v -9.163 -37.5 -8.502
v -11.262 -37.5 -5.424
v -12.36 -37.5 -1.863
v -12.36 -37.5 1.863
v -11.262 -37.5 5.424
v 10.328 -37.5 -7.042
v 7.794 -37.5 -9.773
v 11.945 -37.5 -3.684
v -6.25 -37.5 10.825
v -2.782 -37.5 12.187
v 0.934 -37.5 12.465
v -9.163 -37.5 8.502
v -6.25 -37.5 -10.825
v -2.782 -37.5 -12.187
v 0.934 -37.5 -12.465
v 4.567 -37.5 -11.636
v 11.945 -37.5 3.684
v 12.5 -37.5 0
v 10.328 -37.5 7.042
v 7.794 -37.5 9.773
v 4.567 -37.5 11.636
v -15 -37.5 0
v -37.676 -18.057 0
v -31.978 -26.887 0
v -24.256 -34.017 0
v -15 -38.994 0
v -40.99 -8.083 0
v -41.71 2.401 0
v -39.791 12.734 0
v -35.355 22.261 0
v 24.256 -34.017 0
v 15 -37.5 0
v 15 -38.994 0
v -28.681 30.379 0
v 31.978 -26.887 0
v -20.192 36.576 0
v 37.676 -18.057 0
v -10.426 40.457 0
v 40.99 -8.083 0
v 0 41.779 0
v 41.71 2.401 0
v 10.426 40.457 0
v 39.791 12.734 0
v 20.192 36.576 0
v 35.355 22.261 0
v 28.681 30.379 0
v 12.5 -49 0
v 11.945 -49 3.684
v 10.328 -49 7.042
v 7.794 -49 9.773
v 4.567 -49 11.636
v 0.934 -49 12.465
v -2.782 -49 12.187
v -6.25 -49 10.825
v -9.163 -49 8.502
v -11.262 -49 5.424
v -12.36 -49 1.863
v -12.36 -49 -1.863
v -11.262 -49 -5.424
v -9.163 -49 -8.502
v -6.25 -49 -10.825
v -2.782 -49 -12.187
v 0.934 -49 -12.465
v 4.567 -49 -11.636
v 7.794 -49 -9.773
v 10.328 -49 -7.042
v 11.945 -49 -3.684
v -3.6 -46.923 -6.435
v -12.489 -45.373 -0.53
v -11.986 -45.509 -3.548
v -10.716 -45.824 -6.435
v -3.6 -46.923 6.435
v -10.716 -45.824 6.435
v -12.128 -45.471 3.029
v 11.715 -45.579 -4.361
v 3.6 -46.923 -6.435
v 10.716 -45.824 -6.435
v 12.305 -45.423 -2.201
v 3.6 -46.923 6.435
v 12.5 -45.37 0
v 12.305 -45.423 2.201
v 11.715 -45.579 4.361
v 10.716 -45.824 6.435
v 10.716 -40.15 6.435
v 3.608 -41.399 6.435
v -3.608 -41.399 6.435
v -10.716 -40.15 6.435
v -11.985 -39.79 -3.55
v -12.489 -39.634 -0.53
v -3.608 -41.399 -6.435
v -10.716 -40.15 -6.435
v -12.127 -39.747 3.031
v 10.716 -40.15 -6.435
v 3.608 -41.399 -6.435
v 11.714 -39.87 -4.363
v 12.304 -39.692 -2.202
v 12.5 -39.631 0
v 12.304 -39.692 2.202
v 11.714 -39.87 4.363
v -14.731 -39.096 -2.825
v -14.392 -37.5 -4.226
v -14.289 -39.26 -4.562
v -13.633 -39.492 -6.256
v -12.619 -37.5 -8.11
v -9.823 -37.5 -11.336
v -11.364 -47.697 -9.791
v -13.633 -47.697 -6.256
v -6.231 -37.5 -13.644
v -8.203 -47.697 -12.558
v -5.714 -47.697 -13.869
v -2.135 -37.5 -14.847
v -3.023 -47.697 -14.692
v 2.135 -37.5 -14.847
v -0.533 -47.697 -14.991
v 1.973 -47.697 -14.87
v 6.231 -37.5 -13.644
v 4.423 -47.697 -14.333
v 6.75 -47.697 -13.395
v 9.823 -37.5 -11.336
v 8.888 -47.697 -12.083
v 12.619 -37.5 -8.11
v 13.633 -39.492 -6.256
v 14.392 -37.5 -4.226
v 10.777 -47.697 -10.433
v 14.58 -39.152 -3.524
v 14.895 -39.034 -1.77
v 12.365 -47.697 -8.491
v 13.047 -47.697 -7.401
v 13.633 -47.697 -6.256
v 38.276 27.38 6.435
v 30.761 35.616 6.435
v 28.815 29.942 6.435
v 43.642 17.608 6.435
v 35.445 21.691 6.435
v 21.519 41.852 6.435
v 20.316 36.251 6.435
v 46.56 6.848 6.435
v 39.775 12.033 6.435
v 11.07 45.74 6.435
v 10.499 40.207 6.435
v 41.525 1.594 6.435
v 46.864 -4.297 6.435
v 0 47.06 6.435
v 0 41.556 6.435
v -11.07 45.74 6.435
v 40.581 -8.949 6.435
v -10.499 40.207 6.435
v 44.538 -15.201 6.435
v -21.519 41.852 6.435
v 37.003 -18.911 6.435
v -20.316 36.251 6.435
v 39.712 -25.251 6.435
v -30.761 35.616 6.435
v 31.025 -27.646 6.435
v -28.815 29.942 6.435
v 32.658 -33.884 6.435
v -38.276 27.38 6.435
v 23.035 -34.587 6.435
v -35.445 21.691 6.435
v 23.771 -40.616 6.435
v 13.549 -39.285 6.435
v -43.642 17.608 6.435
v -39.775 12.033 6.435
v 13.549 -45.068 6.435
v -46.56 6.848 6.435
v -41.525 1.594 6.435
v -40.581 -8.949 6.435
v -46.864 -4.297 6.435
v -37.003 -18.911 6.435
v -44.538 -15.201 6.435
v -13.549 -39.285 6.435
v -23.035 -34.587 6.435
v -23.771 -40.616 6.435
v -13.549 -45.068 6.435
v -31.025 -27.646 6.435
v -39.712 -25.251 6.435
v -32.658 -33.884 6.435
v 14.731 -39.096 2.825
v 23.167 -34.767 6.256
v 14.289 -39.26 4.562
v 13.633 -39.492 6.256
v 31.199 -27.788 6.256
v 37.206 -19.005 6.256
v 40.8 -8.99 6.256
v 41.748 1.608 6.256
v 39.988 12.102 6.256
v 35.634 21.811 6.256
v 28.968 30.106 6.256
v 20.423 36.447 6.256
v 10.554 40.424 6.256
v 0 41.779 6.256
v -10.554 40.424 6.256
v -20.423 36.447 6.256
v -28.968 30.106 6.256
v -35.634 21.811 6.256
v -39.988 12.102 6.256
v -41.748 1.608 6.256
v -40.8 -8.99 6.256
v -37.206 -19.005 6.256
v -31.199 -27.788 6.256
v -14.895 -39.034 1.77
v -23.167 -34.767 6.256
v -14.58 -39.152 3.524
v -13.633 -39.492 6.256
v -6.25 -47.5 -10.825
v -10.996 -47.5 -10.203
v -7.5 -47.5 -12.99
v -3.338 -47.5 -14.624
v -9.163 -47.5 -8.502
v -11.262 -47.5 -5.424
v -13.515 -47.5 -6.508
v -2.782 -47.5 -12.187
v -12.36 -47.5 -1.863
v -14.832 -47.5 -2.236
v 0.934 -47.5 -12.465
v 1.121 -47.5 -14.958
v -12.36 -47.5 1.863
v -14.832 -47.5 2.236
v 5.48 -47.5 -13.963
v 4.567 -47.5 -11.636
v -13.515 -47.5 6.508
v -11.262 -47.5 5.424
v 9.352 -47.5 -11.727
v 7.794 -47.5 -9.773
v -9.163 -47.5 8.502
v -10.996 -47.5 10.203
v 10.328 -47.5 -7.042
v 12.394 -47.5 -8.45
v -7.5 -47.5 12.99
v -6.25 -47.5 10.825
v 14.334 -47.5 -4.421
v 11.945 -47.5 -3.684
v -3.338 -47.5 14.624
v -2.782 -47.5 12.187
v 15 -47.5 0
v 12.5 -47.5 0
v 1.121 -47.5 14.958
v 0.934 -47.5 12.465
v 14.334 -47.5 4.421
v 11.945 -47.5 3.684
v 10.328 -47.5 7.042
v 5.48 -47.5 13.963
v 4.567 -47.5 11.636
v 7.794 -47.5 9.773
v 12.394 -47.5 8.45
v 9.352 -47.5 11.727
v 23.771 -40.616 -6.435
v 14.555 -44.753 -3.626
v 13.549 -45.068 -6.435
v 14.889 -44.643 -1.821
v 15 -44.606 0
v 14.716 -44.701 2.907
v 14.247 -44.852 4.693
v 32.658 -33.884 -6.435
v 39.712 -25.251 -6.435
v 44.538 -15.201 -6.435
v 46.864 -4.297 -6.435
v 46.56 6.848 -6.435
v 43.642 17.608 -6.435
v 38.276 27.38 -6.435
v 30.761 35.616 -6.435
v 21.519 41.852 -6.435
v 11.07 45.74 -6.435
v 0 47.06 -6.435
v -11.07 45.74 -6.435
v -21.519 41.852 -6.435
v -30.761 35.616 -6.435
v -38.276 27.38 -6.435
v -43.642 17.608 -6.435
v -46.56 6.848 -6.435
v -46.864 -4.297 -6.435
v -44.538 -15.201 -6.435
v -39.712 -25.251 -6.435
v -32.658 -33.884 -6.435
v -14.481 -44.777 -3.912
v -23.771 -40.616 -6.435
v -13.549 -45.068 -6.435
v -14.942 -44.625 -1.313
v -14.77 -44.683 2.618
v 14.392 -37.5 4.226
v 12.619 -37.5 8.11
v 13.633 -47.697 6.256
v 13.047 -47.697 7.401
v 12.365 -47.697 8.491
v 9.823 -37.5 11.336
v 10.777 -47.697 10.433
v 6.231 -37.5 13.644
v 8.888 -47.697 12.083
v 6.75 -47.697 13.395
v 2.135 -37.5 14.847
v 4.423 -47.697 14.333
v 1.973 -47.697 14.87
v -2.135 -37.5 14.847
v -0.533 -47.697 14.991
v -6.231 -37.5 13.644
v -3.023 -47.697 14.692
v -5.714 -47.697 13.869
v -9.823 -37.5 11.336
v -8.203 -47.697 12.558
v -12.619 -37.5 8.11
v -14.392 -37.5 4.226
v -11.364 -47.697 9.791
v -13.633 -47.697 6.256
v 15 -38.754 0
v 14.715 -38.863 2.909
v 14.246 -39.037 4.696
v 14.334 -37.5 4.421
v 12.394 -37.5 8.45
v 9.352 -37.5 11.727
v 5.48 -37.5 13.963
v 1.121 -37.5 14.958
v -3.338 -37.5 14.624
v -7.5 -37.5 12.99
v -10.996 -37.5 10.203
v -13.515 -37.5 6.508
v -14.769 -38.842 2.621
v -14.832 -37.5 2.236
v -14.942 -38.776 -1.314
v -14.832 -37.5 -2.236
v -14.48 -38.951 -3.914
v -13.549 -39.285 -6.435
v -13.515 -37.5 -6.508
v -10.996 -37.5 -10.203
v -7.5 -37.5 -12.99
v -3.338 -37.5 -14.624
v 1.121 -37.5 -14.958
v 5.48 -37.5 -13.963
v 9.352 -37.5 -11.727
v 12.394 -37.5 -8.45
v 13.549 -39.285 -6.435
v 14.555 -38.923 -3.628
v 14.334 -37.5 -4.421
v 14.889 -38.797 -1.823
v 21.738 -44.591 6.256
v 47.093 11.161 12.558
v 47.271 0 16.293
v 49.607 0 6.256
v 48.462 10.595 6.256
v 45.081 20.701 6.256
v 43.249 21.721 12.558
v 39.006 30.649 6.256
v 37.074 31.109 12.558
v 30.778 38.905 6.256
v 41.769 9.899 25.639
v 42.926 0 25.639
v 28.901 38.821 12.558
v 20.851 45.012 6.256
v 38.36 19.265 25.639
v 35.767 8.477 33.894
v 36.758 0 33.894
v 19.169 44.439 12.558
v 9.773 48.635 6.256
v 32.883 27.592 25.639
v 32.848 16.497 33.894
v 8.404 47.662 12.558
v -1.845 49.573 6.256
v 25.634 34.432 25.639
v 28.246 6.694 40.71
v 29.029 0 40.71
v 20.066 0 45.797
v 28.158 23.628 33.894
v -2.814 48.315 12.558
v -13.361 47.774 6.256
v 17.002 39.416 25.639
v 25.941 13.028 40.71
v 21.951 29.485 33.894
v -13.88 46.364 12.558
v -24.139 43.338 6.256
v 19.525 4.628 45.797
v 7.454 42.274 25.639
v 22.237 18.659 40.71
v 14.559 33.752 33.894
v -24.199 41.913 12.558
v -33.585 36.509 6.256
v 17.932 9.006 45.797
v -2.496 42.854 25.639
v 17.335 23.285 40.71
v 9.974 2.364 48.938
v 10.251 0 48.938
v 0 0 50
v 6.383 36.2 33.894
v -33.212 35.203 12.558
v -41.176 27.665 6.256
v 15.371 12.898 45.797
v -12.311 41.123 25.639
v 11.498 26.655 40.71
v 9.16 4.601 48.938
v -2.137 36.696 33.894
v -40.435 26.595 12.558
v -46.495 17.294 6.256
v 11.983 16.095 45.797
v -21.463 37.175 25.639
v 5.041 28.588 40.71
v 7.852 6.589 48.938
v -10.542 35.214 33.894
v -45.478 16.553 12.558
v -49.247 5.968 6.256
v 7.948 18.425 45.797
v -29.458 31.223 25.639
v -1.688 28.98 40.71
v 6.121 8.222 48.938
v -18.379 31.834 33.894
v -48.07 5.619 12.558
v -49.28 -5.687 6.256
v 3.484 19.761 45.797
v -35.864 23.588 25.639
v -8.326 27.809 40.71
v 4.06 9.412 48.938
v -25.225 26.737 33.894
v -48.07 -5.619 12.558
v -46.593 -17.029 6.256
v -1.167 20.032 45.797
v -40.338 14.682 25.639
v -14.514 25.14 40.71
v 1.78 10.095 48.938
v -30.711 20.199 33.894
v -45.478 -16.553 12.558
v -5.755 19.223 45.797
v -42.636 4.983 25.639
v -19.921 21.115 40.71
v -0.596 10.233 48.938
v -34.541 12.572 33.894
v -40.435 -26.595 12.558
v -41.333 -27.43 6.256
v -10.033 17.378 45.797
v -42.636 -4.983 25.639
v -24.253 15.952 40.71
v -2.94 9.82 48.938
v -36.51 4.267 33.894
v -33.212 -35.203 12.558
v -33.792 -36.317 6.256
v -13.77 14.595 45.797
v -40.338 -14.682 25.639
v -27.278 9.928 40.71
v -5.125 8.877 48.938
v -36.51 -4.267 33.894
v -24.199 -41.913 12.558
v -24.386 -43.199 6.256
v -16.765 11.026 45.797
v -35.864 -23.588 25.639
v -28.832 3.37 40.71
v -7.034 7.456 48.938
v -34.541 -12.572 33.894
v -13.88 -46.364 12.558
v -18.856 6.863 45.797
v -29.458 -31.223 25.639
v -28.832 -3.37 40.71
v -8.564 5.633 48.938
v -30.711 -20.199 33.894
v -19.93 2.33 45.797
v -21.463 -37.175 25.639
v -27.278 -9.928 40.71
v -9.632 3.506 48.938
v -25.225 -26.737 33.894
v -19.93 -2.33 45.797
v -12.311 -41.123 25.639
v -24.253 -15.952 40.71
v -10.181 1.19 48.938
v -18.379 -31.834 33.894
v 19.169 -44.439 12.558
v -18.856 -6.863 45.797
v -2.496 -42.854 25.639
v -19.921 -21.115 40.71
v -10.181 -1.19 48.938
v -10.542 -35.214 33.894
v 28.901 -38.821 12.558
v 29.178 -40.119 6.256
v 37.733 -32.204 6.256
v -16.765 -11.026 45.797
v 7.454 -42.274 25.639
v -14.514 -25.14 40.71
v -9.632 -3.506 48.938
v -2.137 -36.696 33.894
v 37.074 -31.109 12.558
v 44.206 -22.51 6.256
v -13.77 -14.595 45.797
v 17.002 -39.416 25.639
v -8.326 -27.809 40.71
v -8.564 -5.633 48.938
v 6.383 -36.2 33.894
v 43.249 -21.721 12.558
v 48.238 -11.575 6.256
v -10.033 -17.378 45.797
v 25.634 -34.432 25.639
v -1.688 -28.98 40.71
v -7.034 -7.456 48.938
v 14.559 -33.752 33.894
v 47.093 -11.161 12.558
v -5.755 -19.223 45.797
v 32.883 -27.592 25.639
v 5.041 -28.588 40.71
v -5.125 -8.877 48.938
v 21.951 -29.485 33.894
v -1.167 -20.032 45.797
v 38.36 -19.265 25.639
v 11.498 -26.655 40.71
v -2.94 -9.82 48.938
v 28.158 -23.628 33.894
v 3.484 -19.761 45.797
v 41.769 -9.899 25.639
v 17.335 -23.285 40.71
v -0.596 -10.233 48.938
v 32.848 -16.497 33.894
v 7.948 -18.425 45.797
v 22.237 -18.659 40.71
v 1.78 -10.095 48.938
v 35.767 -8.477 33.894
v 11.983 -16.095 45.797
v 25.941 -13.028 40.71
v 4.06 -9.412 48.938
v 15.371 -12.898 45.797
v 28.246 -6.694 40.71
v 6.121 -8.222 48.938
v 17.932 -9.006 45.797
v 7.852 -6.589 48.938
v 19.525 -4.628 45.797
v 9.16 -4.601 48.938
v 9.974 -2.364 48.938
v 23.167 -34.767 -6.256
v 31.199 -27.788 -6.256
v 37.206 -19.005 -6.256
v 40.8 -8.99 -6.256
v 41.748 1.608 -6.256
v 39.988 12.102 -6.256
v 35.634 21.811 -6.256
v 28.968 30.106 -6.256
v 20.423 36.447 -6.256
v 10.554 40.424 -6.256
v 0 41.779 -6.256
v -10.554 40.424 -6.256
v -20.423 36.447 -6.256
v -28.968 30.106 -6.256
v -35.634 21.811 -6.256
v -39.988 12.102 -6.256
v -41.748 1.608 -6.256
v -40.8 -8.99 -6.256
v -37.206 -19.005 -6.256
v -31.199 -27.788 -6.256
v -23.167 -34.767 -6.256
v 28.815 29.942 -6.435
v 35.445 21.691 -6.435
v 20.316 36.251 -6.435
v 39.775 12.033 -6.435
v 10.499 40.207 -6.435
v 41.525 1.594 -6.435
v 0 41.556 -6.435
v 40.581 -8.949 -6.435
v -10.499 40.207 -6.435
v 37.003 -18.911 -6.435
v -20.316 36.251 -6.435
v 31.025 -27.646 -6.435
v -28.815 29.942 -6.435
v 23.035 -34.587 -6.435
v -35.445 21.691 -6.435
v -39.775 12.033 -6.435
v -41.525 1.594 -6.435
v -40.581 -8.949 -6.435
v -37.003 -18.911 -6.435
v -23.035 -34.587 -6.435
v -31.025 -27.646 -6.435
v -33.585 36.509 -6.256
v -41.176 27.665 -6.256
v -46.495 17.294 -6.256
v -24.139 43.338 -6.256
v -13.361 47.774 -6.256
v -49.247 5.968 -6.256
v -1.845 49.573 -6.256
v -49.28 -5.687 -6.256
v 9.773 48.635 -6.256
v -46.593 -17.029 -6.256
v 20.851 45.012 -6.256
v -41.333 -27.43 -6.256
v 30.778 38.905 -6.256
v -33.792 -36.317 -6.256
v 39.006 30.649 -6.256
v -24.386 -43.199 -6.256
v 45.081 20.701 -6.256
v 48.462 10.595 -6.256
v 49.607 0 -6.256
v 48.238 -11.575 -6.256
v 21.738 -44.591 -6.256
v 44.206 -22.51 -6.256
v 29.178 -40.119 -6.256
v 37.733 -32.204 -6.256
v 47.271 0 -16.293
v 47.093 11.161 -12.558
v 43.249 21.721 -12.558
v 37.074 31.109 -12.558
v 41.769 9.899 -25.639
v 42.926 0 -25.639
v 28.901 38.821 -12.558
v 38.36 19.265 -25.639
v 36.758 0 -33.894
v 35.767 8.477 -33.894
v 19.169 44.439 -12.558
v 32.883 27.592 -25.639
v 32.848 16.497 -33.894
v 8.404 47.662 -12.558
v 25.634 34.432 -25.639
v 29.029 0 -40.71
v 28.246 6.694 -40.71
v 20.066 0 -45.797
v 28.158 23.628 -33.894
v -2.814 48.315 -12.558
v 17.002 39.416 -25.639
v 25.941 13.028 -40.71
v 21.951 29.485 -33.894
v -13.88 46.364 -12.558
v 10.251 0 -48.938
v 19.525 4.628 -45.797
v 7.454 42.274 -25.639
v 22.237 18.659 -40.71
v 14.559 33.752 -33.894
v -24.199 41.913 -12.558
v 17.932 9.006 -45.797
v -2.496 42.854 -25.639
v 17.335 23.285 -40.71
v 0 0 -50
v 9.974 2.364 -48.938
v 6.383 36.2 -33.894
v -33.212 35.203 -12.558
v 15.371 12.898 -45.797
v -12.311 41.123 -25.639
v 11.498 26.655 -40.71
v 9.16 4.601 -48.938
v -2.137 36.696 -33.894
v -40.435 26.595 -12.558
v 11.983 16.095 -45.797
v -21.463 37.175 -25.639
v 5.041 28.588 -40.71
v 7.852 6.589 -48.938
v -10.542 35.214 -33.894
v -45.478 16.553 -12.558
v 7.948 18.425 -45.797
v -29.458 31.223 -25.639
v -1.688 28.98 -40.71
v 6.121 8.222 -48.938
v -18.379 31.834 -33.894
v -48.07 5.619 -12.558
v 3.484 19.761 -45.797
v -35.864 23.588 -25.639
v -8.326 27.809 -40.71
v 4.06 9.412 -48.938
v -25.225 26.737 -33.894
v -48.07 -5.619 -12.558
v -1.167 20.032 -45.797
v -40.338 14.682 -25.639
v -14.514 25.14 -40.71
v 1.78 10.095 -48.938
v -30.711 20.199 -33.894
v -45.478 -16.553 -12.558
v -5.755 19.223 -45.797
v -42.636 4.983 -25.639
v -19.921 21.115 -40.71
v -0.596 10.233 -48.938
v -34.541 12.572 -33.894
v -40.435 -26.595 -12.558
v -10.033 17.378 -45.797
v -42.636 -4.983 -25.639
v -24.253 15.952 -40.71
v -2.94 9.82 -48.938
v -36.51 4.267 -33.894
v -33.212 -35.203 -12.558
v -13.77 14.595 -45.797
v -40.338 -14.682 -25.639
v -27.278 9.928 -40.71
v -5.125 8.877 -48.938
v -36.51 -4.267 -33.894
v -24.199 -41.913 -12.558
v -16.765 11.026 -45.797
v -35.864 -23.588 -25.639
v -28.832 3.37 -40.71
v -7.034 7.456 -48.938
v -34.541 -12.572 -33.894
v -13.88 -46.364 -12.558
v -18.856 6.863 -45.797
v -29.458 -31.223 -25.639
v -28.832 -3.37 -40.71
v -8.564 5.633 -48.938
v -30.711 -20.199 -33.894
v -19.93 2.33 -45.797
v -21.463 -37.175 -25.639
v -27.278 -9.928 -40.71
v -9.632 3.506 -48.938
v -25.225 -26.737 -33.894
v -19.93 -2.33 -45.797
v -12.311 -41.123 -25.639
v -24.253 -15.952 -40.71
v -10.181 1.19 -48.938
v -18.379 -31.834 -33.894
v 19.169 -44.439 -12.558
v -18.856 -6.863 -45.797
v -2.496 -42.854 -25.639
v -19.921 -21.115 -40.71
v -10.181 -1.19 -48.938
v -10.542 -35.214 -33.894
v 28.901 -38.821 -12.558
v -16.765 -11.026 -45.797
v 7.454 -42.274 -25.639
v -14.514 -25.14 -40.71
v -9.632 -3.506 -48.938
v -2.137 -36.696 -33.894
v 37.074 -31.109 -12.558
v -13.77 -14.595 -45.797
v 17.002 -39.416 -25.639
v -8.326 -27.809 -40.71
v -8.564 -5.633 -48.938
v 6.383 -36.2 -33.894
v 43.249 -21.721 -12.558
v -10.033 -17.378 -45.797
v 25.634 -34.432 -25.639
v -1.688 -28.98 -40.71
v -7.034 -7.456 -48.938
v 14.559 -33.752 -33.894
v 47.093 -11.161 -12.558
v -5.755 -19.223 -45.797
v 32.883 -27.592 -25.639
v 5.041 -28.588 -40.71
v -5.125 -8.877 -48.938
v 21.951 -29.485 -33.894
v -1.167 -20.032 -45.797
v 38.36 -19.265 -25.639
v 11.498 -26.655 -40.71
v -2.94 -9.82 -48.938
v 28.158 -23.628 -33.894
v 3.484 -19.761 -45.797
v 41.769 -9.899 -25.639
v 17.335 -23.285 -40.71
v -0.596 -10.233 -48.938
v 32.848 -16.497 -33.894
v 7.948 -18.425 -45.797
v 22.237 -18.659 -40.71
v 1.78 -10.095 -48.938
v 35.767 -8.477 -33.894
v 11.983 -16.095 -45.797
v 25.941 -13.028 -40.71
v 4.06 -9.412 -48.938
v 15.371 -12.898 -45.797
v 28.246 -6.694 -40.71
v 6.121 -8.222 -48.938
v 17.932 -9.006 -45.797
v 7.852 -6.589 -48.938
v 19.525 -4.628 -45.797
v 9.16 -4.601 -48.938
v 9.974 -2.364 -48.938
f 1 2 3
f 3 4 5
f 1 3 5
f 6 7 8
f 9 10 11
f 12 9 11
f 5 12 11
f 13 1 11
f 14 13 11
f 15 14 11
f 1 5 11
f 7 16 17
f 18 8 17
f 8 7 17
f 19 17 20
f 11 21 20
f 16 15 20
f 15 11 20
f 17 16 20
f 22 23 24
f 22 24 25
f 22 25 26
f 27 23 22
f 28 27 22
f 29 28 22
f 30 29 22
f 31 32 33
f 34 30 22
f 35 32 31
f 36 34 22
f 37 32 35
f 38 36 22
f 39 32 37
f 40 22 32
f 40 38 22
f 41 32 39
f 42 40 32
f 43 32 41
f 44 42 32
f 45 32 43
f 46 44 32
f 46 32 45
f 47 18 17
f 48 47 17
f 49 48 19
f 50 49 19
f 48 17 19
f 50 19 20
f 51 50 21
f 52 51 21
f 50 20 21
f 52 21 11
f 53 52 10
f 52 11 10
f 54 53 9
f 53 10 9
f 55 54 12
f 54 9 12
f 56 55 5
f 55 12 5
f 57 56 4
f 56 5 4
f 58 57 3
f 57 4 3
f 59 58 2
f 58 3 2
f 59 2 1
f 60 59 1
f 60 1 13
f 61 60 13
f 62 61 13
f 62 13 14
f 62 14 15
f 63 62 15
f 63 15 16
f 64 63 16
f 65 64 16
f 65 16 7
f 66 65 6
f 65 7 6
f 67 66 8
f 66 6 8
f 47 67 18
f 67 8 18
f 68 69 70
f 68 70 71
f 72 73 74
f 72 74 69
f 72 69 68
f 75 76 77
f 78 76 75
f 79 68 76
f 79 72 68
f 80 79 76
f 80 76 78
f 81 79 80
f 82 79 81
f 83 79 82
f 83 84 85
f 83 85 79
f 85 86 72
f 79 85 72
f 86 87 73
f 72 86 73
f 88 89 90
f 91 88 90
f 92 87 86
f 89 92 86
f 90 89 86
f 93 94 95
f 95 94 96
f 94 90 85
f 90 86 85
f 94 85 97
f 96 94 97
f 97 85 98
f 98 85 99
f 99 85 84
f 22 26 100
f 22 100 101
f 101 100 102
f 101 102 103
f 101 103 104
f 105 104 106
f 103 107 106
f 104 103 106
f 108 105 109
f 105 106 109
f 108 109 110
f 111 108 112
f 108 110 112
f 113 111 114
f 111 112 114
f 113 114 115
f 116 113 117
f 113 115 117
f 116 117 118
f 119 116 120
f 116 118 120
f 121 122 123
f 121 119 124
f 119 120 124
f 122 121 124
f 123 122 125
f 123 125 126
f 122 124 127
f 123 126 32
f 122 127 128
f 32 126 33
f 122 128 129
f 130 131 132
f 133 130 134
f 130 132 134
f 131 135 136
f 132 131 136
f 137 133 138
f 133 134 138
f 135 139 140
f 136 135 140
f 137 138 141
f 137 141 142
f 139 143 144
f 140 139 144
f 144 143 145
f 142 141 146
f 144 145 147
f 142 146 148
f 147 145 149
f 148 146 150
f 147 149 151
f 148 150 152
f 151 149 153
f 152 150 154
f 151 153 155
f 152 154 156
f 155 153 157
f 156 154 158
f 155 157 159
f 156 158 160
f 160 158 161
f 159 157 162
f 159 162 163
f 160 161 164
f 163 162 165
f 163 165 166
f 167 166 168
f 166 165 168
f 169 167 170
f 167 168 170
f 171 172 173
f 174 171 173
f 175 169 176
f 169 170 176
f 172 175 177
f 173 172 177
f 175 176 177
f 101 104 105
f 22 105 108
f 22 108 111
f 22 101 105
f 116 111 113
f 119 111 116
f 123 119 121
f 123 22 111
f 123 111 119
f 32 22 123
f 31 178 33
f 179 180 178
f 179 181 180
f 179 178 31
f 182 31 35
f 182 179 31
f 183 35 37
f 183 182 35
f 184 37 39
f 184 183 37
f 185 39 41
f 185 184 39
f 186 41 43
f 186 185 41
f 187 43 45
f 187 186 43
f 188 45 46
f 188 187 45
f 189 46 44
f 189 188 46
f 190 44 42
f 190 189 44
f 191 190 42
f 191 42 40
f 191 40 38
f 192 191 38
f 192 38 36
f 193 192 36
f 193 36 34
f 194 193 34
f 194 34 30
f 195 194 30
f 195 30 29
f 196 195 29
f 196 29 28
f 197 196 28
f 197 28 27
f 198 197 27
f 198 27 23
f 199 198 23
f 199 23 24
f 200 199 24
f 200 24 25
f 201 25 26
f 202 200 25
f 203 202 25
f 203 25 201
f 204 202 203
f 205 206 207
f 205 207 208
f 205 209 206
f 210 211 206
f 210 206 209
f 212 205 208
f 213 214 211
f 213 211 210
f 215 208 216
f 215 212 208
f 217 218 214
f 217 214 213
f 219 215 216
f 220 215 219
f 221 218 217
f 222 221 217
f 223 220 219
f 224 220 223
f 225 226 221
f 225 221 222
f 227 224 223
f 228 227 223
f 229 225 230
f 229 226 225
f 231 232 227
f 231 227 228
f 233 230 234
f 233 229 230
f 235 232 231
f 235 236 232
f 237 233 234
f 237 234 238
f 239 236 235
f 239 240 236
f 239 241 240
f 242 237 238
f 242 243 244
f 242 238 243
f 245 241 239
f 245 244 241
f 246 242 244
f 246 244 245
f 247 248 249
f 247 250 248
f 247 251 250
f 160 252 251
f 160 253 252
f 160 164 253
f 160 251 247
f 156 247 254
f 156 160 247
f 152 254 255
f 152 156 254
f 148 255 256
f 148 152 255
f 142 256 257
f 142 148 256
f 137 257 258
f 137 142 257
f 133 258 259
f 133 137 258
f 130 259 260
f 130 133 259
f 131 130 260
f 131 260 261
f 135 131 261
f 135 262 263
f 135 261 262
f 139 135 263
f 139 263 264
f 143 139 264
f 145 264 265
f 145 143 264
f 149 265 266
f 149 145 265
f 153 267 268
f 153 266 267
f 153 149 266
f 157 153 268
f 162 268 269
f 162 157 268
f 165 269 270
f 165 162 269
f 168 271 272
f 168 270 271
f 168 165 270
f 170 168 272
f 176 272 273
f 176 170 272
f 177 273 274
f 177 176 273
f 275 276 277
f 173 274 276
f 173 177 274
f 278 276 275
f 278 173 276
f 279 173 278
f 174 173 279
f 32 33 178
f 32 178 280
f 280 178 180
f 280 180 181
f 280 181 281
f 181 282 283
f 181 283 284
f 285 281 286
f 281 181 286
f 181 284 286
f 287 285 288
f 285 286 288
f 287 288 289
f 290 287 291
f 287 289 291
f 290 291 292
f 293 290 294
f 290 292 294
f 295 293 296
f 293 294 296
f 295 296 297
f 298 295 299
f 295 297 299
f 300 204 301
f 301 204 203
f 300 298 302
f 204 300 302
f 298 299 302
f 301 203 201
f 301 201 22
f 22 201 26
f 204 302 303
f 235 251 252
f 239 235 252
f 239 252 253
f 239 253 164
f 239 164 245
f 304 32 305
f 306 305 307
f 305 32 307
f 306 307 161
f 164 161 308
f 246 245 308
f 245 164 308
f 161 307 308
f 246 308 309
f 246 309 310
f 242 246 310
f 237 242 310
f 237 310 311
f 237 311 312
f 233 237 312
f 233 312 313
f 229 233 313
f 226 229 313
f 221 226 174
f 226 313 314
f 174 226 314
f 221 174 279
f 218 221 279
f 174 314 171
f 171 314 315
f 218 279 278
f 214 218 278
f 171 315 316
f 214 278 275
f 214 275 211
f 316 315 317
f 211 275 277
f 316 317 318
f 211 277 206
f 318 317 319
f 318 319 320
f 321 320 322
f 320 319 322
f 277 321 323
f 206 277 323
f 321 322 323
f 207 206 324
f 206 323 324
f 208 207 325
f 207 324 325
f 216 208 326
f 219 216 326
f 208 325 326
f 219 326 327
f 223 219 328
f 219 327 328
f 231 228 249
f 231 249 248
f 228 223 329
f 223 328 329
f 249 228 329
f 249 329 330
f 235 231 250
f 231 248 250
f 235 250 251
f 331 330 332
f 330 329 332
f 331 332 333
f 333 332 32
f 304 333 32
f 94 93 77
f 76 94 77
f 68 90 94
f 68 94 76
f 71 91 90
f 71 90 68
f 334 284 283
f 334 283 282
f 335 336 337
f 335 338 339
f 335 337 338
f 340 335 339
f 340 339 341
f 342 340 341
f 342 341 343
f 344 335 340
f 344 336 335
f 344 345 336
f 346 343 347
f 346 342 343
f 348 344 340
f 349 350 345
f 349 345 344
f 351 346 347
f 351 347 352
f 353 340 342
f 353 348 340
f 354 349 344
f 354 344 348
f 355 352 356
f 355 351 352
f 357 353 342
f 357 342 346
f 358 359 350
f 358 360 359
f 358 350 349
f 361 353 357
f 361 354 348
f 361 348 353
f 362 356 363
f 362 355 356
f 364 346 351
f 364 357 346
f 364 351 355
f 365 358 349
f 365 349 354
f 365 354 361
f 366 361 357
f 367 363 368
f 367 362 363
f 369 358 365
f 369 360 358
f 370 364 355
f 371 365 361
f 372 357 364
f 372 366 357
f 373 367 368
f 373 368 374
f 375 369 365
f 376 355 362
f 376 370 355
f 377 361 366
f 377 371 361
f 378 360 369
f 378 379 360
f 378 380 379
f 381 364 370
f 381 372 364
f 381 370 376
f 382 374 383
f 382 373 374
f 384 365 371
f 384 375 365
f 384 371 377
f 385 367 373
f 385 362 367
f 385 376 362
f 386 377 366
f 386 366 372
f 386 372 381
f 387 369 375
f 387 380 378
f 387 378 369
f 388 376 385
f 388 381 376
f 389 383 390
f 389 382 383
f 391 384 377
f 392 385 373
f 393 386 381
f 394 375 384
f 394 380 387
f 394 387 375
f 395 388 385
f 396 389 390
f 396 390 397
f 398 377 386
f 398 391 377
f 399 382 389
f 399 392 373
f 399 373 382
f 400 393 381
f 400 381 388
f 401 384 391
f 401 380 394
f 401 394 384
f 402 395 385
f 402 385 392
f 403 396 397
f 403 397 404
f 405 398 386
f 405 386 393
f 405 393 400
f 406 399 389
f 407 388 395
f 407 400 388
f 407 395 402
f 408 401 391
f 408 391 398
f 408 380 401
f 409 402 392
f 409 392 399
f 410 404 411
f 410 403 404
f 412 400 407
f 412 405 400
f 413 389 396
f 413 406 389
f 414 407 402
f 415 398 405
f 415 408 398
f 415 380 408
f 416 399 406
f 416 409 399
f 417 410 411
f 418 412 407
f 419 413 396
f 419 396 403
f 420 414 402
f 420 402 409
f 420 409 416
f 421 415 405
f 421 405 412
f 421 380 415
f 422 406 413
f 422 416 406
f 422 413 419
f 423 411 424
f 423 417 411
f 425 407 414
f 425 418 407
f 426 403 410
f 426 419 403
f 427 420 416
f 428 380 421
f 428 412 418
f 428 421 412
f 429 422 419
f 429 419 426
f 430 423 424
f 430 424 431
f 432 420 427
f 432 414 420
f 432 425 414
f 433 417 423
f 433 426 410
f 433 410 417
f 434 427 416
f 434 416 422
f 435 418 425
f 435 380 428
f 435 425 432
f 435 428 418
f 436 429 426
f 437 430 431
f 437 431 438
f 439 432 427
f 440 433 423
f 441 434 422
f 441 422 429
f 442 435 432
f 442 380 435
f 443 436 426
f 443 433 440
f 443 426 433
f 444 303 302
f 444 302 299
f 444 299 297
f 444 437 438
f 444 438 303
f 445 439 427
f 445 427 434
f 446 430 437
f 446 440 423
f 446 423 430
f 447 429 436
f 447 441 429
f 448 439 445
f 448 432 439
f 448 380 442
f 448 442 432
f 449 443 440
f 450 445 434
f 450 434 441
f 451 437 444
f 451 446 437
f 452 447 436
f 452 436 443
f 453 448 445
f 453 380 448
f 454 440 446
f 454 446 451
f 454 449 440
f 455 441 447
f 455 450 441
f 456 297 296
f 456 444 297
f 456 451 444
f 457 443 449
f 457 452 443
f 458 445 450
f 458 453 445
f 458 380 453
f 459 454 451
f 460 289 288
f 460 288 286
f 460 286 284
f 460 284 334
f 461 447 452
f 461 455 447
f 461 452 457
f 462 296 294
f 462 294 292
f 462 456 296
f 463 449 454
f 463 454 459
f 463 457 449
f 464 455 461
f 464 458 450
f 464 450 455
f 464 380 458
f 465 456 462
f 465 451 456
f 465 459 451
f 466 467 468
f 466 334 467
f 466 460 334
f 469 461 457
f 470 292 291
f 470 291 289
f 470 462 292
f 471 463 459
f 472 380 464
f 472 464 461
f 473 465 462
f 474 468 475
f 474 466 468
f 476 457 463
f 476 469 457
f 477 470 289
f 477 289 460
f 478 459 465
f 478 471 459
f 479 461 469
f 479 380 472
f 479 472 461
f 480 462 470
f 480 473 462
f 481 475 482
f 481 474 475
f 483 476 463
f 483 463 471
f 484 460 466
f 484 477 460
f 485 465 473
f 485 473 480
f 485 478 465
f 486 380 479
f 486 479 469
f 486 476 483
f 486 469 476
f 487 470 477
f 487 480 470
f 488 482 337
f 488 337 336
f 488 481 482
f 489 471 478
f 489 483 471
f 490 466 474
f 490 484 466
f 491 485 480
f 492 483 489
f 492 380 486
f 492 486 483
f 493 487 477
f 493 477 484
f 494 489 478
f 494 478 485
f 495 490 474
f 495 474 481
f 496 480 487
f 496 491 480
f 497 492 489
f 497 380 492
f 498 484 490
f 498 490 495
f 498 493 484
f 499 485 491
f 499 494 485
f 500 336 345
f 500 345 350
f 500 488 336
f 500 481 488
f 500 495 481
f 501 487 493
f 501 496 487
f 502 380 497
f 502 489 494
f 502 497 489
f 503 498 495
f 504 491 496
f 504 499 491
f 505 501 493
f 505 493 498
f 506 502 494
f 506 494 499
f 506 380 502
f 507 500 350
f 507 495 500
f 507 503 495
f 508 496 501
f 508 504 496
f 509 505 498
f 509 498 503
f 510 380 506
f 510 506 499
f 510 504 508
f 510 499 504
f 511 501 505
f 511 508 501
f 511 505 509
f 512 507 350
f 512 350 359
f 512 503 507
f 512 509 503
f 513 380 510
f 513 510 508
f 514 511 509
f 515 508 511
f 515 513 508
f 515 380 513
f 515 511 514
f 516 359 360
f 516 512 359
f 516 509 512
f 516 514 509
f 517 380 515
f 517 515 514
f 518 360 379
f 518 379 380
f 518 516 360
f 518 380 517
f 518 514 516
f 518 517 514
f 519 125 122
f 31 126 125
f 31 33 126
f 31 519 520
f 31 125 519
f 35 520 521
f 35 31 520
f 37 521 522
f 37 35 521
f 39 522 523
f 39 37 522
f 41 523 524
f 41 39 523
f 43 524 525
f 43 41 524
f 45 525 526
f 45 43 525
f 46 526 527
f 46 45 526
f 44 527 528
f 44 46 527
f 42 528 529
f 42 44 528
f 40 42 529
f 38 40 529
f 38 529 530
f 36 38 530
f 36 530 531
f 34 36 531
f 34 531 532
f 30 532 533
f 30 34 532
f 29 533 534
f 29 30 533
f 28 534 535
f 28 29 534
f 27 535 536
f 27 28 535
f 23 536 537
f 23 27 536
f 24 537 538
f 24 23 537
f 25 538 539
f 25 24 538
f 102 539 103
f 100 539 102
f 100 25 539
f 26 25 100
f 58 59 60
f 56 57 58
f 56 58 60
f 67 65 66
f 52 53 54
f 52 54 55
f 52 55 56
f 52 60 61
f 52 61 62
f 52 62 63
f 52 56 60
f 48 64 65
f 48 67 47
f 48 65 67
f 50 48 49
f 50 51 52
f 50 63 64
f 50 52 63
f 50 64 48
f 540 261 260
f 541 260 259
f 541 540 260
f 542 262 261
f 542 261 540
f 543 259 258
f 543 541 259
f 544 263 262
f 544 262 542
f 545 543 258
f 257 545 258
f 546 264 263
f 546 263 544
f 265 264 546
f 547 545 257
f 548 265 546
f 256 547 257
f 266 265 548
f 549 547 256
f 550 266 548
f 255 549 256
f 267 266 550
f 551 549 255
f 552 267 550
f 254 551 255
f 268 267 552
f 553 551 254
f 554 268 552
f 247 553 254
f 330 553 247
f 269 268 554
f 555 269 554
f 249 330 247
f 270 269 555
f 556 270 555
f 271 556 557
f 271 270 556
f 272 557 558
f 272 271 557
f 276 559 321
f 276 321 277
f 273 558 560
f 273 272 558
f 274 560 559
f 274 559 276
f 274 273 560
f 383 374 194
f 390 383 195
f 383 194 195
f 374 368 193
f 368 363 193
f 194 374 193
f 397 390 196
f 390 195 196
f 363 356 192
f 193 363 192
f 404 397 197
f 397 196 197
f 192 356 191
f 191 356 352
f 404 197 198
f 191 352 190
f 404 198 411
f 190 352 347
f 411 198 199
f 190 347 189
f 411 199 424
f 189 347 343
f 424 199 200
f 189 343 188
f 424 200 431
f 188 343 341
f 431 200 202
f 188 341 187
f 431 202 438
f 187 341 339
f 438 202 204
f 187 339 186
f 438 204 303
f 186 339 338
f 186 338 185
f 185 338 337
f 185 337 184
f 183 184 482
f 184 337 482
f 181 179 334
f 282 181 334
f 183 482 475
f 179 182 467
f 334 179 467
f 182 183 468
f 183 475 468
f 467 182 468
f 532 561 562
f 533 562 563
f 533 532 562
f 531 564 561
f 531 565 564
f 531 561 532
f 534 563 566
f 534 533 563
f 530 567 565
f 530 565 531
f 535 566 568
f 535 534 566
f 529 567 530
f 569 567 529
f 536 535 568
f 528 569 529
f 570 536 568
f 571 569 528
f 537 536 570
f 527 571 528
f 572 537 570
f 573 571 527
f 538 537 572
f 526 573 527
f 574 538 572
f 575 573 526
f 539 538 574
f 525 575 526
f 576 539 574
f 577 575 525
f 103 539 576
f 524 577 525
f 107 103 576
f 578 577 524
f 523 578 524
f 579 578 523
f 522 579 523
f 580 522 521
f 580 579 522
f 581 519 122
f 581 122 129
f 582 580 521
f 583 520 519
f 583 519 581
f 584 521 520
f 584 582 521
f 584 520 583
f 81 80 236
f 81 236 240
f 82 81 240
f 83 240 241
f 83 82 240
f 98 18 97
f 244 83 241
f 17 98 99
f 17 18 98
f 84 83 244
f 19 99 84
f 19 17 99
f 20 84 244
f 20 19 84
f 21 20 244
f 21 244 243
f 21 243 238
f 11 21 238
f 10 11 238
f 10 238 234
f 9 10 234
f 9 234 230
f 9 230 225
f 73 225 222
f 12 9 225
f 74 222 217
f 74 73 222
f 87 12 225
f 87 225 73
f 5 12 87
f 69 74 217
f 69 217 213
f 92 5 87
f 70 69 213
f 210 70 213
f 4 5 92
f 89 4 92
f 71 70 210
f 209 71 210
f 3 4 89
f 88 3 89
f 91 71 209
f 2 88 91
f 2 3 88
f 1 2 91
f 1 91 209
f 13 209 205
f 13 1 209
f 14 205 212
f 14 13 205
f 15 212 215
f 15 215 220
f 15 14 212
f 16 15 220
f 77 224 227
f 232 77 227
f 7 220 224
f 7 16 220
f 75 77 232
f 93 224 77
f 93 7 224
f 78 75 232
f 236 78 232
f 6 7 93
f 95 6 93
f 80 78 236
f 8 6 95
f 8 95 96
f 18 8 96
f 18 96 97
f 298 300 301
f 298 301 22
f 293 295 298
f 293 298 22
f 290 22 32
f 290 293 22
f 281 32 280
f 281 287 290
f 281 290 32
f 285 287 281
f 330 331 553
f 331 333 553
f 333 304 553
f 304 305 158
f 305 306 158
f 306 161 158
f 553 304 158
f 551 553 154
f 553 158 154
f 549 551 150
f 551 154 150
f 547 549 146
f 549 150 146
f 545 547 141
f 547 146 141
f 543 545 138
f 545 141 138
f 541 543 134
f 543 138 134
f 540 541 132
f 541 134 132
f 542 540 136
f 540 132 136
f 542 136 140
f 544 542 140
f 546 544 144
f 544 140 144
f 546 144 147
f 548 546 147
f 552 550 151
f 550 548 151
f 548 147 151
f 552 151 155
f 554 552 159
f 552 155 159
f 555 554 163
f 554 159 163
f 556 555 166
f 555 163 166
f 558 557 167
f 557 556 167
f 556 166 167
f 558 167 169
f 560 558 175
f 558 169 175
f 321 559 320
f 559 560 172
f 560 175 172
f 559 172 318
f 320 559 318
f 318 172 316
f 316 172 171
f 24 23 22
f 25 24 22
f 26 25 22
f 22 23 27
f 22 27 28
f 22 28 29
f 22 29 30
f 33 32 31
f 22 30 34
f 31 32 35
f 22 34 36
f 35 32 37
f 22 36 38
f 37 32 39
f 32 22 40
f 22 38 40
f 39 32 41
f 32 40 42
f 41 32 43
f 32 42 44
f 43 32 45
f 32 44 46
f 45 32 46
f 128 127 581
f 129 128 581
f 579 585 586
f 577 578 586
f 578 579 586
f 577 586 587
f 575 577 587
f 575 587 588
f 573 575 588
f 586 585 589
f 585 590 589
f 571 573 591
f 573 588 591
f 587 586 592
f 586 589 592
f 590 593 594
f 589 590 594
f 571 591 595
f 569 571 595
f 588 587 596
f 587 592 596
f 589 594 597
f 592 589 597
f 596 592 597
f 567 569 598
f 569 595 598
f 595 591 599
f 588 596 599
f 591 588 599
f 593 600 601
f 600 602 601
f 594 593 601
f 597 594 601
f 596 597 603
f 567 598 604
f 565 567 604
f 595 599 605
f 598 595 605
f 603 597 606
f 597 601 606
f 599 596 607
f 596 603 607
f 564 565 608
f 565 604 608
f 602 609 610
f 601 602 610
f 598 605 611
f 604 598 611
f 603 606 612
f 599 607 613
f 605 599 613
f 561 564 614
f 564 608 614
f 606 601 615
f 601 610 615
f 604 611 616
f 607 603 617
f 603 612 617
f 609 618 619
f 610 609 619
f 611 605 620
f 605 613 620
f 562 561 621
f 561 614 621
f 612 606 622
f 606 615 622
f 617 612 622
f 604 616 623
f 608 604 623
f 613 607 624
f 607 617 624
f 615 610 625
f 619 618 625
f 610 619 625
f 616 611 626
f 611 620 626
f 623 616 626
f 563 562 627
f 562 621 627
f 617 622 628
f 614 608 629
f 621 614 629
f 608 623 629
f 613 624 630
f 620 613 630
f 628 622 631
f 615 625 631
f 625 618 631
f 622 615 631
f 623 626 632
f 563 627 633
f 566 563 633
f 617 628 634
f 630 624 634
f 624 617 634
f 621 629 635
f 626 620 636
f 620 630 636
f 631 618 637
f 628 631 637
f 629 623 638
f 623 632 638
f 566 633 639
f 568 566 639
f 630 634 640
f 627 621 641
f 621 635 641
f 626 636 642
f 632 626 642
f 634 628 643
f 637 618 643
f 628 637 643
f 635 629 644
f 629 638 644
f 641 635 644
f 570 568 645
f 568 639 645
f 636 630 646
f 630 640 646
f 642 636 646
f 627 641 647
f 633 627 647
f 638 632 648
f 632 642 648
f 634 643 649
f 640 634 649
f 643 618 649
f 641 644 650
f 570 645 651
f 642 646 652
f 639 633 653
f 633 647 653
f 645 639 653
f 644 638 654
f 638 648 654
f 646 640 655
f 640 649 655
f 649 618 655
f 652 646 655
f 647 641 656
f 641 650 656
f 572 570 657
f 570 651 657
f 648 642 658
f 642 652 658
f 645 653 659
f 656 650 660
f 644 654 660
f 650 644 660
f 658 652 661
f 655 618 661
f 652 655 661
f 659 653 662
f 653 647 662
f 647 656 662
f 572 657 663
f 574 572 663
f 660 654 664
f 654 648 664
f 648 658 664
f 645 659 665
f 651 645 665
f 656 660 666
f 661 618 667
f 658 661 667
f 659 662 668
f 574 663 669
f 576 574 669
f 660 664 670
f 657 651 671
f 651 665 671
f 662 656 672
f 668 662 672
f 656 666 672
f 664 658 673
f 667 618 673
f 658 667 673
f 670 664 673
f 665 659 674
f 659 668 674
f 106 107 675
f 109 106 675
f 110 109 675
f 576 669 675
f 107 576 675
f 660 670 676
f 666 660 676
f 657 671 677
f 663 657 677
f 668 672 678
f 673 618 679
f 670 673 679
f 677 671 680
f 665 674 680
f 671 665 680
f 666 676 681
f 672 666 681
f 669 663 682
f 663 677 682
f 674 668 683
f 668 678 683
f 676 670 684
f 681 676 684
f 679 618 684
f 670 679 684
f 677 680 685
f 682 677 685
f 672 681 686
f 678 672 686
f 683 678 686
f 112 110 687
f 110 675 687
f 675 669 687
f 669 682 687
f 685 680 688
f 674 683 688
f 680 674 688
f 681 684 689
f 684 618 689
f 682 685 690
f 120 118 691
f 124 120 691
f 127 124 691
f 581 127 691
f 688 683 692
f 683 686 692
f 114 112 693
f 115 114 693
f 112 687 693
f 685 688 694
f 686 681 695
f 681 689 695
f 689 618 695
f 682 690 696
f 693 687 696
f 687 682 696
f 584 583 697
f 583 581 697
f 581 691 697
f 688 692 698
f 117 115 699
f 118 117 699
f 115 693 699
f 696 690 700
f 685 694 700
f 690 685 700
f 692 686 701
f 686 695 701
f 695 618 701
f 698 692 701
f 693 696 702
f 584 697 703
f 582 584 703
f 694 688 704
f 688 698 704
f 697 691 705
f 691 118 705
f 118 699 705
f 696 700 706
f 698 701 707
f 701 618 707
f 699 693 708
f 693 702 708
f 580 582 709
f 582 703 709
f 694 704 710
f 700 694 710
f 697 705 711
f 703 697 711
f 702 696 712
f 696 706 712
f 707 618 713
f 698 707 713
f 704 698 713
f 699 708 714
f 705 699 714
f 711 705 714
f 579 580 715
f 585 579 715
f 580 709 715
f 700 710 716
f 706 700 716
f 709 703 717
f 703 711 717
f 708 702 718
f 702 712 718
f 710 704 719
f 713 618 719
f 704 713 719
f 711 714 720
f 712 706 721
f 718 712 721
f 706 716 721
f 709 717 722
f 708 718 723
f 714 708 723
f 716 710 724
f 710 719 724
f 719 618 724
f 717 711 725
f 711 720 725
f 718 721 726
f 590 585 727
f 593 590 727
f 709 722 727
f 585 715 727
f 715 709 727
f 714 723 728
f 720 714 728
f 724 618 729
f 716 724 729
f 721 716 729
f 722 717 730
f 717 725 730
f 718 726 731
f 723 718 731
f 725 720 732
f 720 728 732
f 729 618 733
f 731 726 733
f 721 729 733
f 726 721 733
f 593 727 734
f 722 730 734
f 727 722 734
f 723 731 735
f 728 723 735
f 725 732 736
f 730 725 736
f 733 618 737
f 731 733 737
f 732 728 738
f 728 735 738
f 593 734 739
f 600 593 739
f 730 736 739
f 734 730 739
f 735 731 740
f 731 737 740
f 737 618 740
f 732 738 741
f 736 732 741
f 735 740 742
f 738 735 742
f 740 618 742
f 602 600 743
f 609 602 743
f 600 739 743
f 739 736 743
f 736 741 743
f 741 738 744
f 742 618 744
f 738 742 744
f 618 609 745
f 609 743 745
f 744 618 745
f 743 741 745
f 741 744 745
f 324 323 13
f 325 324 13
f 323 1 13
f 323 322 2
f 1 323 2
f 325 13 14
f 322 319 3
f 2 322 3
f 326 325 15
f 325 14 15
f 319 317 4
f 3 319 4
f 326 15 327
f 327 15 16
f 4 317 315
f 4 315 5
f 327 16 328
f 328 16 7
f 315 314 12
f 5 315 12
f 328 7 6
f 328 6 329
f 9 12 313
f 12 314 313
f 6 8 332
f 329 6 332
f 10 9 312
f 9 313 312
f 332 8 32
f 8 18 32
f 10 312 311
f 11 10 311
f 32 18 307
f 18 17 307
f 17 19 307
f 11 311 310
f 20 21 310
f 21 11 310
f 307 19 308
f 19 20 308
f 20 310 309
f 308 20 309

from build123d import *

# Parameters (mm, degrees)
F0_R          = 50
F1_DEPTH      = 50
F2_R          = 49.99999
F3_DEPTH      = 50
F4_R          = 49.99999
F6_R          = 15
F7_DEPTH      = 2.5
F7_DEPTH_BACK = 10
F8_W          = 11.879876256
F8_H          = 12.5124454498
F10_W         = 5.5049955845
F10_H         = 12.8705808893
F13_R         = 15
F13_R_2       = 12.5
F14_DEPTH     = 10
F15_R         = 12.5
F16_DEPTH     = 11.5


# Not quite as in the source:
# - a fillet or chamfer is up to 0.001 mm smaller than in the source, because OpenCascade refuses the exact size


with BuildPart() as f1:
    # F0 (on Top) → F1 (new body)
    with BuildSketch(Plane.XY):
        Circle(F0_R)
    extrude(amount=F1_DEPTH)

    # F2 (radius 50 in the source; OpenCascade refuses exactly that, so slightly less here)
    f2_edges = [f1.edges().sort_by_distance(p)[0] for p in [
        (-50, 0, 50),
    ]]
    fillet(f2_edges, radius=F2_R)


with BuildPart() as f3:
    # F3 (new): a face of the model
    f3_faces = [f1.part.faces().sort_by_distance(p)[0] for p in [
        (0, 0, 0),
    ]]
    extrude(f3_faces, amount=F3_DEPTH)

    # F4 (radius 50 in the source; OpenCascade refuses exactly that, so slightly less here)
    f4_edges = [f3.edges().sort_by_distance(p)[0] for p in [
        (-50, 0, -50),
    ]]
    fillet(f4_edges, radius=F4_R)


with BuildPart() as f7_tool:
    # F6 (on offset) → F7 (new body, two sides)
    with BuildSketch(Plane.XZ.offset(47.5)) as f7_sk:
        Circle(F6_R)
    extrude(amount=F7_DEPTH)
    extrude(f7_sk.sketch, amount=-F7_DEPTH_BACK)


with BuildPart() as f1_1:
    add(f1.part)

    # F7: cut by f7_tool
    add(f7_tool.part, mode=Mode.SUBTRACT)


with BuildPart() as f3_1:
    add(f3.part)

    # F7: cut by f7_tool
    add(f7_tool.part, mode=Mode.SUBTRACT)


with BuildPart() as f9_tool:
    # F8 (on Right) → F9 (revolve)
    with BuildSketch(Plane.YZ):
        with Locations((-47.7190874517, 0)):
            Rectangle(F8_W, F8_H)
    revolve(axis=Axis((0, 0, 30.5323097855), (0, 0, 1)))


with BuildPart() as f1_2:
    add(f1_1.part)

    # F9: cut by f9_tool
    add(f9_tool.part, mode=Mode.SUBTRACT)


with BuildPart() as f3_2:
    add(f3_1.part)

    # F9: cut by f9_tool
    add(f9_tool.part, mode=Mode.SUBTRACT)


with BuildPart() as f11:
    # F10 (on Right) → F11 (revolve)
    with BuildSketch(Plane.YZ):
        with Locations((44.3079993129, 0)):
            Rectangle(F10_W, F10_H)
    revolve(axis=Axis((0, 0, 32.3998779058), (0, 0, 1)))

    # F13 (on face) → F14 (join)
    with BuildSketch(Plane.XZ.offset(37.5)):
        Circle(F13_R)
        Circle(F13_R_2, mode=Mode.SUBTRACT)
    extrude(amount=F14_DEPTH)


with BuildPart() as f16:
    # F15 (on face) → F16 (new body)
    with BuildSketch(Plane.XZ.offset(37.5)):
        Circle(F15_R)
    extrude(amount=F16_DEPTH)


solid = Compound([f1_2.part, f3_2.part, f11.part, f16.part])
